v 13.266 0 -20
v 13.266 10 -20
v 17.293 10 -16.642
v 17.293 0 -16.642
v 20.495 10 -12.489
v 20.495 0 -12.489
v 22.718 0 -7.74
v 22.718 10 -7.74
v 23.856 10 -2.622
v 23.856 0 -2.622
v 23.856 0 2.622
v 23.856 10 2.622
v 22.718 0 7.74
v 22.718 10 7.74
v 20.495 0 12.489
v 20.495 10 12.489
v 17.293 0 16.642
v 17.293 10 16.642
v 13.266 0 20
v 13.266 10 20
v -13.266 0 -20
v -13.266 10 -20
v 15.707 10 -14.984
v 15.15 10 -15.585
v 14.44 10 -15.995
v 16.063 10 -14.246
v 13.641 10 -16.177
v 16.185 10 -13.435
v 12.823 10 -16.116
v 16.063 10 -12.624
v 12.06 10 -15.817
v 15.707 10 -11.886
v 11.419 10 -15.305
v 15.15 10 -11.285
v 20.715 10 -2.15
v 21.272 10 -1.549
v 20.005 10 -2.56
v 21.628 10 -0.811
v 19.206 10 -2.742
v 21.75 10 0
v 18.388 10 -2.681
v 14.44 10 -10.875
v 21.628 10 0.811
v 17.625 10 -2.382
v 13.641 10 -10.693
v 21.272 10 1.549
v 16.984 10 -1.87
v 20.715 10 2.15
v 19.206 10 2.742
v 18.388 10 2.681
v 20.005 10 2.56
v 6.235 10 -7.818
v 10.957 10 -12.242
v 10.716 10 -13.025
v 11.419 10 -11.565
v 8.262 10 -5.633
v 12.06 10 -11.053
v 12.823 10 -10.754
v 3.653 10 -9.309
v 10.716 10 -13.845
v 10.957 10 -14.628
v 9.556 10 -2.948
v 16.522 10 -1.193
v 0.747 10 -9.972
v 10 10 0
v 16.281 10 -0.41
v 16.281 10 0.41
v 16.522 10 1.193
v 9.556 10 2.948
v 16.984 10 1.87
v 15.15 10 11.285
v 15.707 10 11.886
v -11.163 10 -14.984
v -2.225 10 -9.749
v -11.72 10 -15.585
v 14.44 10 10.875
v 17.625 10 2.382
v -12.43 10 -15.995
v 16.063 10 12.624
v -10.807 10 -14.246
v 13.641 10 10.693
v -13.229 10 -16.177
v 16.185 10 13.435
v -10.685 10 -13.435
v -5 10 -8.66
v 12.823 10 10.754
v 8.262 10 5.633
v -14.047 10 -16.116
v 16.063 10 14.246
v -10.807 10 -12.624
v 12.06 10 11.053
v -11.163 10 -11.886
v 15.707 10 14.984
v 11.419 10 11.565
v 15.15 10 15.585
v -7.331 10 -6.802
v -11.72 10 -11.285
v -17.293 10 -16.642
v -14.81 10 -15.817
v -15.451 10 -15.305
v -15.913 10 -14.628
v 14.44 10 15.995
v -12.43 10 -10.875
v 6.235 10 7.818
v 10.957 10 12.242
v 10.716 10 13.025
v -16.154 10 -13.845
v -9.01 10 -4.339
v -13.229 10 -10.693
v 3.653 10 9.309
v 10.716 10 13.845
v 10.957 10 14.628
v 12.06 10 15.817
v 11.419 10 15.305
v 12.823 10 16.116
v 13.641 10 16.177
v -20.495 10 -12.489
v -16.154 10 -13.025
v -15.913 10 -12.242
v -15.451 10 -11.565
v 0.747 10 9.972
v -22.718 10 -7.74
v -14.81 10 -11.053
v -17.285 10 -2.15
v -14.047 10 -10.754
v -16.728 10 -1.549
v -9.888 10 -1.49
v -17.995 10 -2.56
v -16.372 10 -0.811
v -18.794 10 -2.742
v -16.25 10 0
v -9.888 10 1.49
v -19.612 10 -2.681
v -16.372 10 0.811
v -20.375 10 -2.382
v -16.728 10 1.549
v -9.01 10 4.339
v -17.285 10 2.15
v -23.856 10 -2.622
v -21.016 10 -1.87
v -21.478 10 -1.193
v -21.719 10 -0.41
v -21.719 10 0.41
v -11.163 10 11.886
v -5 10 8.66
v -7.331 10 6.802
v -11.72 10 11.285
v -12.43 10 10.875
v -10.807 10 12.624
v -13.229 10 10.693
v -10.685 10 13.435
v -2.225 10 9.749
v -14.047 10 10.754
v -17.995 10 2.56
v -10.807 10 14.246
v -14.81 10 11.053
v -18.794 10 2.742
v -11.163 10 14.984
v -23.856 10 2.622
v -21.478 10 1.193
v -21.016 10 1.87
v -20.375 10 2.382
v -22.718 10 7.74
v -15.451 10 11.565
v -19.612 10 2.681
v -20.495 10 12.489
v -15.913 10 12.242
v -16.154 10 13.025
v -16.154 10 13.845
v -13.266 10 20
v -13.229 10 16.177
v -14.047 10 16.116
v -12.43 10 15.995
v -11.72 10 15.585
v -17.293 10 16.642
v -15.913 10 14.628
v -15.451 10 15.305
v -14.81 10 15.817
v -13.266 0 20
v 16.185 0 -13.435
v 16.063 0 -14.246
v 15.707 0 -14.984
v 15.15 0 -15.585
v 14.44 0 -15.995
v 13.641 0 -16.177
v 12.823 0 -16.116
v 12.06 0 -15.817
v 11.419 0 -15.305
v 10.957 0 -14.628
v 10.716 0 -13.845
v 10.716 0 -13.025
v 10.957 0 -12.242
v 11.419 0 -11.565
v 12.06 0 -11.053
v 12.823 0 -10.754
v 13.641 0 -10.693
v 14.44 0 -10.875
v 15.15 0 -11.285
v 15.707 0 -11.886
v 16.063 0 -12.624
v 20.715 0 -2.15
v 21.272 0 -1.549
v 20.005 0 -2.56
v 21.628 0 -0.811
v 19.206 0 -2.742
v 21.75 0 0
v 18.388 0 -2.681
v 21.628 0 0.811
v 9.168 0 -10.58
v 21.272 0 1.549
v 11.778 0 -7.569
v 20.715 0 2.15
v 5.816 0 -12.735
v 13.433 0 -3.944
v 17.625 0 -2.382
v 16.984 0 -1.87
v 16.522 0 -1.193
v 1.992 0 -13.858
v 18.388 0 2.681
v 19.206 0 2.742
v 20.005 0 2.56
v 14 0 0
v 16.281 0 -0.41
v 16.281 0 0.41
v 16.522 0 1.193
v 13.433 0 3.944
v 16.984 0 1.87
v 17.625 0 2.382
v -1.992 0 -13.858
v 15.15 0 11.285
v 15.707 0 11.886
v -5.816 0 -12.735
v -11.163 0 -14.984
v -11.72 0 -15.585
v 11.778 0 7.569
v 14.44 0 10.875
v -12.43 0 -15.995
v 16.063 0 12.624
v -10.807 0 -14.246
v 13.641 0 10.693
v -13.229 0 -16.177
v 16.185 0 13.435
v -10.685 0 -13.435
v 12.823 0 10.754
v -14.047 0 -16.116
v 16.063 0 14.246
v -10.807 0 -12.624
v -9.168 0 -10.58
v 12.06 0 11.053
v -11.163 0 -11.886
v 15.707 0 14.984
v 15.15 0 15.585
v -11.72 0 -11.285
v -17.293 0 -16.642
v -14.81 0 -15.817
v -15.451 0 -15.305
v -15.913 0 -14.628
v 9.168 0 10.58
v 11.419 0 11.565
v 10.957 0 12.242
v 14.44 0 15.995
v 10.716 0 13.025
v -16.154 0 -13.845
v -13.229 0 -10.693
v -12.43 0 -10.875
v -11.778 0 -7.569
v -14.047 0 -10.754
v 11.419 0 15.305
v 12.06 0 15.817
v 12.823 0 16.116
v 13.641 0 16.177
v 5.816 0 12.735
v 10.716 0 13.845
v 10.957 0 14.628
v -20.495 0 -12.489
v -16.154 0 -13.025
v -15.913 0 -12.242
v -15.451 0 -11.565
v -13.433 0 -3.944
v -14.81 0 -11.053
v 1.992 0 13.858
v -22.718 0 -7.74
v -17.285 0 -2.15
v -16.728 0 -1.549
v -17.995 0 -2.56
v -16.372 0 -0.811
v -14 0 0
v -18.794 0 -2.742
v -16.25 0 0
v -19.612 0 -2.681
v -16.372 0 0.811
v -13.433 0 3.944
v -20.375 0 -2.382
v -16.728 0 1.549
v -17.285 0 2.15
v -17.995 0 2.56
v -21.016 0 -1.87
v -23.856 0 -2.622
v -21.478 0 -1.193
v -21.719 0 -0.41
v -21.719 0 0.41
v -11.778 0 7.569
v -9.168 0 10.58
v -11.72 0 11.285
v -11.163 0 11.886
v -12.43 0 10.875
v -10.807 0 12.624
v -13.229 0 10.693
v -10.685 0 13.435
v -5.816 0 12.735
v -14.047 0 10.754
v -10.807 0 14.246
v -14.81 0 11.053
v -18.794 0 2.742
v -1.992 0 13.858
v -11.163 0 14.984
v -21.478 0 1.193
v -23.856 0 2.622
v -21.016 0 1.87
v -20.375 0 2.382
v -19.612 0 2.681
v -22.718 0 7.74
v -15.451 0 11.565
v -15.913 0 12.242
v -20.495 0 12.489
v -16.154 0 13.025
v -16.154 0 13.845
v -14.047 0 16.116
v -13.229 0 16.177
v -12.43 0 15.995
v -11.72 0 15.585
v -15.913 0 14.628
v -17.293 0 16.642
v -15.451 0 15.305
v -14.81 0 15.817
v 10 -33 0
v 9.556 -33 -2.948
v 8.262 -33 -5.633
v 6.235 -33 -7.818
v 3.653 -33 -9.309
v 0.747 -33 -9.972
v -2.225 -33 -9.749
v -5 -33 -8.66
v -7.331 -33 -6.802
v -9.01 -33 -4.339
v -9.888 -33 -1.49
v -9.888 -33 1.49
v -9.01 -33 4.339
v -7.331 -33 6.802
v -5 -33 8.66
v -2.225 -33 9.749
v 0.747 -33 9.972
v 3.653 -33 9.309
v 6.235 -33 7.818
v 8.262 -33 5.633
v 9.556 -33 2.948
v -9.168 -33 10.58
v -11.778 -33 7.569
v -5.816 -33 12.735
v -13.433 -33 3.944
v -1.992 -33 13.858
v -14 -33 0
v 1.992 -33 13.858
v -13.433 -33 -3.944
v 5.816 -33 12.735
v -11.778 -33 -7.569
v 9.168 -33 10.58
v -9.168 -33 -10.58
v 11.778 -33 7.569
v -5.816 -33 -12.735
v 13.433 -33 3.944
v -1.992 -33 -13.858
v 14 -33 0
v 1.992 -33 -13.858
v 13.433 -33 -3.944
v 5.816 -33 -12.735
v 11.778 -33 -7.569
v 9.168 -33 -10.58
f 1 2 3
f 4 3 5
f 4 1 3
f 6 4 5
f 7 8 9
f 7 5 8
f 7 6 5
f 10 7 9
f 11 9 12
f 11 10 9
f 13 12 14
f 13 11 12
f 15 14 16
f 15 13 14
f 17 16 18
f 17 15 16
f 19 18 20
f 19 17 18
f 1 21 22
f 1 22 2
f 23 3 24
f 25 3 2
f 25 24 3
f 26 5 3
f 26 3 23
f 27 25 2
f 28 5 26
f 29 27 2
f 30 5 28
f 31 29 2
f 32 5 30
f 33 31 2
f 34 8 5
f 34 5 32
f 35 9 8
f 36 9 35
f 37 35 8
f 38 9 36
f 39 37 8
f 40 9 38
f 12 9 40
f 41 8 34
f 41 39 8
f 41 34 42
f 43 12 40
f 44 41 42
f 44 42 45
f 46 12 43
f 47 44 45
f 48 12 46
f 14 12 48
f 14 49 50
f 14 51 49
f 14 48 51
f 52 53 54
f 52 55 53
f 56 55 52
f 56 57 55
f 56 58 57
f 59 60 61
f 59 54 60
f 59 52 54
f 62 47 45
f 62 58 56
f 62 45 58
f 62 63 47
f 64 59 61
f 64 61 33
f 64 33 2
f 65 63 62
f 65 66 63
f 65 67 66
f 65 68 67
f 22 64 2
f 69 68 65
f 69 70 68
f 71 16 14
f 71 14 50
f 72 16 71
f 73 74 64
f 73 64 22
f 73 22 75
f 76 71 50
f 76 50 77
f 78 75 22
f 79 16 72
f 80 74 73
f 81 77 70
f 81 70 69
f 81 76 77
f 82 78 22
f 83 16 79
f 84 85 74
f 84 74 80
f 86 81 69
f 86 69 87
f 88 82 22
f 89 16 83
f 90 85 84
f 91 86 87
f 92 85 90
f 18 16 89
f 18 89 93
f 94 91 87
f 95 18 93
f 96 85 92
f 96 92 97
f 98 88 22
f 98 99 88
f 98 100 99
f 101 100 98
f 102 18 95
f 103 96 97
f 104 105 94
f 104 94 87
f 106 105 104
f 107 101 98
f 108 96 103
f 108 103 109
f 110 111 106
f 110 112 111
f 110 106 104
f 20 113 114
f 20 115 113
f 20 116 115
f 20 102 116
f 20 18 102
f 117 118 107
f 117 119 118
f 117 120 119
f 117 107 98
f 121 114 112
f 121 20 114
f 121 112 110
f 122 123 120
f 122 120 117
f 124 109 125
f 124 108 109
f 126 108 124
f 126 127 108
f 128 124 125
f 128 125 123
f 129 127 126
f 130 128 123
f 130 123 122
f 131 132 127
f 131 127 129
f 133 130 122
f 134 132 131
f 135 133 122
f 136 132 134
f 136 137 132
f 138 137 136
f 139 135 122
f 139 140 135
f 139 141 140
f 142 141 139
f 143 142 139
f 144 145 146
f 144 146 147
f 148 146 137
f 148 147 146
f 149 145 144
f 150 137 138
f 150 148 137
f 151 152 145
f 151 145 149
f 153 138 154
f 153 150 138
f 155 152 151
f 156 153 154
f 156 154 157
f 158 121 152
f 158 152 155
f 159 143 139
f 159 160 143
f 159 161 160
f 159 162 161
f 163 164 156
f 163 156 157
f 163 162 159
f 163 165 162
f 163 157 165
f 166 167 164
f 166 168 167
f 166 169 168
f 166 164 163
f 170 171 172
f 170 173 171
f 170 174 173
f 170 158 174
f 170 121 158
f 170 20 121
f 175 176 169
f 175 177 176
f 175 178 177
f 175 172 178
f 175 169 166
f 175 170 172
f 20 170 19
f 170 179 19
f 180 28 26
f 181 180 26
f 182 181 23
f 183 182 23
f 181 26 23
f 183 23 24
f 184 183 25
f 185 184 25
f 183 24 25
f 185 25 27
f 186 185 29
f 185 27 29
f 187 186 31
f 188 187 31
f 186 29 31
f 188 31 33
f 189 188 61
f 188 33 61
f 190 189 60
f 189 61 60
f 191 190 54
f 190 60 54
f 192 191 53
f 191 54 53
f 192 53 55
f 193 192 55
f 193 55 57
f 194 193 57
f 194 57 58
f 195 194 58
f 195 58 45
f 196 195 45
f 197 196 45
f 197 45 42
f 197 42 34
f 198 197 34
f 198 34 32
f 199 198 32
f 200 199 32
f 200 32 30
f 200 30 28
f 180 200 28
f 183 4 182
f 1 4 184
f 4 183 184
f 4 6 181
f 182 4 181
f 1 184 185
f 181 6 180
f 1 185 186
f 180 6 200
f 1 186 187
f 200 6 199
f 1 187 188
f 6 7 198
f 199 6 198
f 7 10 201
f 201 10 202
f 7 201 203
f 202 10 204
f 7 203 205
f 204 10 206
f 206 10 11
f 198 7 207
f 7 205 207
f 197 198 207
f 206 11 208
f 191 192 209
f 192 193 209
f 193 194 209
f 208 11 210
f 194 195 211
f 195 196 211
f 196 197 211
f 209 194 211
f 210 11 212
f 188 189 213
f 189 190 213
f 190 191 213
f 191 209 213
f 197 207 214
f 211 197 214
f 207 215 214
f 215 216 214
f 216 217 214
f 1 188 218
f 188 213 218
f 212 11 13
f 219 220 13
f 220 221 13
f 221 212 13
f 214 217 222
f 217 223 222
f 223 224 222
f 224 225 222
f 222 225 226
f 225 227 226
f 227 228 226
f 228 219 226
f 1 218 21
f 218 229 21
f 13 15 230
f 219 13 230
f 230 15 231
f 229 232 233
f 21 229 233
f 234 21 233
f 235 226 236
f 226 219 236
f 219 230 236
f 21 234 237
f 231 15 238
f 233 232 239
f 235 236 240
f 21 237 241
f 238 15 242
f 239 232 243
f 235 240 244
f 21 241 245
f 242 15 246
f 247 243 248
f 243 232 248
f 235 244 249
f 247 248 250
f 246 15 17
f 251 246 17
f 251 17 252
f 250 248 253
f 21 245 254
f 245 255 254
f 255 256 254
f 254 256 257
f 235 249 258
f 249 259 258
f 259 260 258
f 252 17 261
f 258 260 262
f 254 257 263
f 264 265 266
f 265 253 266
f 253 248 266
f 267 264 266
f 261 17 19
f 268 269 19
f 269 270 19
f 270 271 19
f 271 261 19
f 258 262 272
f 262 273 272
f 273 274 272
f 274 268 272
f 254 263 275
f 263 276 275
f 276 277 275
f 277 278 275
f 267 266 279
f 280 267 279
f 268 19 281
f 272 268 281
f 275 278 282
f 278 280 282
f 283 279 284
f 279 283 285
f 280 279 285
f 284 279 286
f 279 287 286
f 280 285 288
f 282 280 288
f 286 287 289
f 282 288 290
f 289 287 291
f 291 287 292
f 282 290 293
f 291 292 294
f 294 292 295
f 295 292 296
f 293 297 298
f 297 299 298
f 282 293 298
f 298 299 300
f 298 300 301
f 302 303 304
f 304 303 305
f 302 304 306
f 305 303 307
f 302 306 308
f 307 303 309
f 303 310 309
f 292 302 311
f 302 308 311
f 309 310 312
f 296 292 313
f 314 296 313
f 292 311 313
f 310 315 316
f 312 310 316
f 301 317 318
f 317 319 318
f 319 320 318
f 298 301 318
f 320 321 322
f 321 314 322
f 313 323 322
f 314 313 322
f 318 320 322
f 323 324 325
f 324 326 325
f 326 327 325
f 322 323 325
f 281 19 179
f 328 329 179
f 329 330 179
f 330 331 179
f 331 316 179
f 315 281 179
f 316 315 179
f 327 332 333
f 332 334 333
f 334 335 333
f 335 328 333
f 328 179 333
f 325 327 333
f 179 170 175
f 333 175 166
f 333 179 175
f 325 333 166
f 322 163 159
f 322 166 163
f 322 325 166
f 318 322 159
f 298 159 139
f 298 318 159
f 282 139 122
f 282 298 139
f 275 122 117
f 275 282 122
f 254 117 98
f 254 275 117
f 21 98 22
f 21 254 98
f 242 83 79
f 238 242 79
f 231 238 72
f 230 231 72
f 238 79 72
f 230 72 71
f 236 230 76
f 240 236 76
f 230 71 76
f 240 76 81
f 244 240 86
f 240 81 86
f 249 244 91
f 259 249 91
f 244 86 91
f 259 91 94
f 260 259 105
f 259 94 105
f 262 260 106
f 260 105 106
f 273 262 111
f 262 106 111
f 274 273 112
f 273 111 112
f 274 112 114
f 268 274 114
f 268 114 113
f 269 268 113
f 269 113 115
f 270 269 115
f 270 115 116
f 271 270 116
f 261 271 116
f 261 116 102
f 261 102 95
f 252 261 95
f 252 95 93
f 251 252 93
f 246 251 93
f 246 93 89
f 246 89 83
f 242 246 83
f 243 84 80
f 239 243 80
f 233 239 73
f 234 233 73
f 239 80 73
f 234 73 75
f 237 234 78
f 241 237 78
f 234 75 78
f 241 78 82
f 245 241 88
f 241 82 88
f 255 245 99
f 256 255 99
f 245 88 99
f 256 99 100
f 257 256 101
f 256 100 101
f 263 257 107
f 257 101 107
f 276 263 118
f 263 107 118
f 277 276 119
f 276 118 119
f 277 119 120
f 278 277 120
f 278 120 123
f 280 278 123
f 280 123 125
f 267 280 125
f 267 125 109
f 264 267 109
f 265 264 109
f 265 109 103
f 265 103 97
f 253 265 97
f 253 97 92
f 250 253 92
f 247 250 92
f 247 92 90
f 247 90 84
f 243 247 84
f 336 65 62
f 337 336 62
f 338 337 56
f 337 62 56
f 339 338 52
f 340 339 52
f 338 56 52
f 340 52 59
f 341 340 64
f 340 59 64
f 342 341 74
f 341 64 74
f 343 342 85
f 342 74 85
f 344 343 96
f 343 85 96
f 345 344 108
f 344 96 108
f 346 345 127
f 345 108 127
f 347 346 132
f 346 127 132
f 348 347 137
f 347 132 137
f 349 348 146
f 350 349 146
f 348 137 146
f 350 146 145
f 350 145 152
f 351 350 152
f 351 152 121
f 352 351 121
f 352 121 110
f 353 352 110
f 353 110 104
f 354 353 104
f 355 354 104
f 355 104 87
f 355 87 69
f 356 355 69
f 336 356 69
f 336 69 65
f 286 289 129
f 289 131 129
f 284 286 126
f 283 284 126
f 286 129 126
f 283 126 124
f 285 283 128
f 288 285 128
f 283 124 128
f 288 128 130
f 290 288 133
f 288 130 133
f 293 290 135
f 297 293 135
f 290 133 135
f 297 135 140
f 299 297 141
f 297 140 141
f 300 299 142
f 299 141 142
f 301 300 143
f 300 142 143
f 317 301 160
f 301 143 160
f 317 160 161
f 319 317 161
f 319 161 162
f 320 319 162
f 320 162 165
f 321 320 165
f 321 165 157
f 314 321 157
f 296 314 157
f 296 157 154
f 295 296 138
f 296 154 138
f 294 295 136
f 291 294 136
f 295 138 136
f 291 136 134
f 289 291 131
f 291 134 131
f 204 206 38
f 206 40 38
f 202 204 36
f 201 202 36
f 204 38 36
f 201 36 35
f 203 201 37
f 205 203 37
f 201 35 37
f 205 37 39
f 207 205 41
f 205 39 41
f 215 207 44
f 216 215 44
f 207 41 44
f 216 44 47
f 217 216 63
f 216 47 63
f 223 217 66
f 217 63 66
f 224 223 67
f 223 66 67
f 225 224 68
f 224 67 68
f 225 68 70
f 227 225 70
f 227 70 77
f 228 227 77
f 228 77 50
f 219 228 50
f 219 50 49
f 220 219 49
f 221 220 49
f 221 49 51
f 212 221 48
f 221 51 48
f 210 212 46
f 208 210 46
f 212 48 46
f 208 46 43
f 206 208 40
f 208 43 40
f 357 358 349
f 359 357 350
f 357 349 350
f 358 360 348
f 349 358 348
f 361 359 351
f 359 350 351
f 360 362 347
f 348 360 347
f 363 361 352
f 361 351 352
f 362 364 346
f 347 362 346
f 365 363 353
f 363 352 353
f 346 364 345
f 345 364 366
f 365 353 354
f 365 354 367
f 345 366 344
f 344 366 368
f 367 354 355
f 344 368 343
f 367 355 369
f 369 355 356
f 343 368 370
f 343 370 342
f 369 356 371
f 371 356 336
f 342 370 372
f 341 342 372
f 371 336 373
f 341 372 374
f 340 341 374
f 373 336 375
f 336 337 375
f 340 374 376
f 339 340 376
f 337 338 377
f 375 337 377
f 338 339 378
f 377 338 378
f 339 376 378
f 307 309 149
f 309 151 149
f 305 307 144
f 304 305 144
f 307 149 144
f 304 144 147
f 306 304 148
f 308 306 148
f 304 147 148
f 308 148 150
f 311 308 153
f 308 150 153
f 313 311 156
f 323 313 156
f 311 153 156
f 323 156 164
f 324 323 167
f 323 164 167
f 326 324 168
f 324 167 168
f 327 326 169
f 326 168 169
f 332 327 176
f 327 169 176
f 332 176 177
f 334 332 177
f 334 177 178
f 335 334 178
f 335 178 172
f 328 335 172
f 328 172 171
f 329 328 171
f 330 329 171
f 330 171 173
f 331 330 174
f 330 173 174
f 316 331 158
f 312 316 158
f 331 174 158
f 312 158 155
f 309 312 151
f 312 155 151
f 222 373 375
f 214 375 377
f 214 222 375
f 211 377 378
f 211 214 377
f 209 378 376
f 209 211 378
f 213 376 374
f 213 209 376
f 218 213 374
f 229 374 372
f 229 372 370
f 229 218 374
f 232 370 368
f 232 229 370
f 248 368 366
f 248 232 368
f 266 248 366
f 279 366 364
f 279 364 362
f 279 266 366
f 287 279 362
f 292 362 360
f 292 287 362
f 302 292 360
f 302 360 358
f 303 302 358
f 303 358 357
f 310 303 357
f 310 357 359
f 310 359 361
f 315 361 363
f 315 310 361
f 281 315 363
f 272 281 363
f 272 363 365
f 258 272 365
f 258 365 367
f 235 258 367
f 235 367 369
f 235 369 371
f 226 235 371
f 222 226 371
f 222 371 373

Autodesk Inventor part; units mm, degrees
ref_plane "YZ Plane" through (0, 0, 0) normal (1, 0, 0) x (0, 1, 0)
ref_plane "XZ Plane" through (0, 0, 0) normal (0, 1, 0) x (-1, 0, 0)
ref_plane "XY Plane" through (0, 0, 0) normal (0, 0, 1) x (1, 0, 0)
sketch "Sketch1" plane through (0, 0, 0) normal (0, 1, 0) x (-1, 0, 0)
  circle A0 centre (0, 0) radius 14
  line L0 (13.2665, 20) -> (-13.2665, 20)
  line L1 (13.2665, -20) -> (-13.2665, -20)
  arc A1 (13.2665, -20) -> (13.2665, 20) centre (0, 0) ccw
  arc A2 (-13.2665, 20) -> (-13.2665, -20) centre (0, 0) ccw
  dimension "d1" = 28
  dimension "d2" = 20
  dimension "d3" = 20
  dimension "d19" = 24
extrude "Extrusion1" add sketch "Sketch1" along normal blind 10
sketch "Sketch2" plane through (0, 10, 0) normal (0, 1, 0) x (1, 0, 0)
  circle A0 centre (0, 0) radius 14 projected
  line L0 (-13.2665, -20) -> (13.2665, -20) projected
  arc A1 (13.2665, -20) -> (13.2665, 20) centre (0, 0) ccw projected
  line L1 (13.2665, 20) -> (-13.2665, 20) projected
  arc A2 (-13.2665, 20) -> (-13.2665, -20) centre (0, 0) ccw projected
  circle A3 centre (-19, 0) radius 2.75
  circle A4 centre (-13.435, 13.435) radius 2.75
  circle A5 centre (-13.435, -13.435) radius 2.75
  line L2 (0, -20) -> (0, 20)
  line L3 (13.2665, 20) -> (-13.2665, 20) projected
  circle A6 centre (19, 0) radius 2.75
  circle A7 centre (13.435, 13.435) radius 2.75
  circle A8 centre (13.435, -13.435) radius 2.75
  dimension "d6" = 5.5
  dimension "d7" = 0
  dimension "d8" = 24
  dimension "d9" = 28
  dimension "d10" = 19
  dimension "d11" = 5.5
  dimension "d12" = 13.435
  dimension "d13" = 13.435
  dimension "d14" = 5.5
  dimension "d15" = 13.435
  dimension "d16" = 13.435
  dimension "d20" = 38
extrude "Extrusion2" cut sketch "Sketch2" against normal blind 10 contours A3 | A4 | A5 | A6 | A7 | A8
sketch "Sketch3" plane through (0, 10, 0) normal (0, 1, 0) x (1, 0, 0)
  circle A0 centre (0, 0) radius 14 projected
  circle A1 centre (0, 0) radius 10
  dimension "d21" = 20
extrude "Extrusion3" add sketch "Sketch3" against normal blind 43
equation "\"d10\" = 0.25 * d9 + 0.5 * d8"
equation "\"d12\" = 0.707107 * d10"
equation "\"d13\" = d12"
equation "\"d15\" = d13"
equation "\"d16\" = d12"
properties part number "PowerScrewNut"
